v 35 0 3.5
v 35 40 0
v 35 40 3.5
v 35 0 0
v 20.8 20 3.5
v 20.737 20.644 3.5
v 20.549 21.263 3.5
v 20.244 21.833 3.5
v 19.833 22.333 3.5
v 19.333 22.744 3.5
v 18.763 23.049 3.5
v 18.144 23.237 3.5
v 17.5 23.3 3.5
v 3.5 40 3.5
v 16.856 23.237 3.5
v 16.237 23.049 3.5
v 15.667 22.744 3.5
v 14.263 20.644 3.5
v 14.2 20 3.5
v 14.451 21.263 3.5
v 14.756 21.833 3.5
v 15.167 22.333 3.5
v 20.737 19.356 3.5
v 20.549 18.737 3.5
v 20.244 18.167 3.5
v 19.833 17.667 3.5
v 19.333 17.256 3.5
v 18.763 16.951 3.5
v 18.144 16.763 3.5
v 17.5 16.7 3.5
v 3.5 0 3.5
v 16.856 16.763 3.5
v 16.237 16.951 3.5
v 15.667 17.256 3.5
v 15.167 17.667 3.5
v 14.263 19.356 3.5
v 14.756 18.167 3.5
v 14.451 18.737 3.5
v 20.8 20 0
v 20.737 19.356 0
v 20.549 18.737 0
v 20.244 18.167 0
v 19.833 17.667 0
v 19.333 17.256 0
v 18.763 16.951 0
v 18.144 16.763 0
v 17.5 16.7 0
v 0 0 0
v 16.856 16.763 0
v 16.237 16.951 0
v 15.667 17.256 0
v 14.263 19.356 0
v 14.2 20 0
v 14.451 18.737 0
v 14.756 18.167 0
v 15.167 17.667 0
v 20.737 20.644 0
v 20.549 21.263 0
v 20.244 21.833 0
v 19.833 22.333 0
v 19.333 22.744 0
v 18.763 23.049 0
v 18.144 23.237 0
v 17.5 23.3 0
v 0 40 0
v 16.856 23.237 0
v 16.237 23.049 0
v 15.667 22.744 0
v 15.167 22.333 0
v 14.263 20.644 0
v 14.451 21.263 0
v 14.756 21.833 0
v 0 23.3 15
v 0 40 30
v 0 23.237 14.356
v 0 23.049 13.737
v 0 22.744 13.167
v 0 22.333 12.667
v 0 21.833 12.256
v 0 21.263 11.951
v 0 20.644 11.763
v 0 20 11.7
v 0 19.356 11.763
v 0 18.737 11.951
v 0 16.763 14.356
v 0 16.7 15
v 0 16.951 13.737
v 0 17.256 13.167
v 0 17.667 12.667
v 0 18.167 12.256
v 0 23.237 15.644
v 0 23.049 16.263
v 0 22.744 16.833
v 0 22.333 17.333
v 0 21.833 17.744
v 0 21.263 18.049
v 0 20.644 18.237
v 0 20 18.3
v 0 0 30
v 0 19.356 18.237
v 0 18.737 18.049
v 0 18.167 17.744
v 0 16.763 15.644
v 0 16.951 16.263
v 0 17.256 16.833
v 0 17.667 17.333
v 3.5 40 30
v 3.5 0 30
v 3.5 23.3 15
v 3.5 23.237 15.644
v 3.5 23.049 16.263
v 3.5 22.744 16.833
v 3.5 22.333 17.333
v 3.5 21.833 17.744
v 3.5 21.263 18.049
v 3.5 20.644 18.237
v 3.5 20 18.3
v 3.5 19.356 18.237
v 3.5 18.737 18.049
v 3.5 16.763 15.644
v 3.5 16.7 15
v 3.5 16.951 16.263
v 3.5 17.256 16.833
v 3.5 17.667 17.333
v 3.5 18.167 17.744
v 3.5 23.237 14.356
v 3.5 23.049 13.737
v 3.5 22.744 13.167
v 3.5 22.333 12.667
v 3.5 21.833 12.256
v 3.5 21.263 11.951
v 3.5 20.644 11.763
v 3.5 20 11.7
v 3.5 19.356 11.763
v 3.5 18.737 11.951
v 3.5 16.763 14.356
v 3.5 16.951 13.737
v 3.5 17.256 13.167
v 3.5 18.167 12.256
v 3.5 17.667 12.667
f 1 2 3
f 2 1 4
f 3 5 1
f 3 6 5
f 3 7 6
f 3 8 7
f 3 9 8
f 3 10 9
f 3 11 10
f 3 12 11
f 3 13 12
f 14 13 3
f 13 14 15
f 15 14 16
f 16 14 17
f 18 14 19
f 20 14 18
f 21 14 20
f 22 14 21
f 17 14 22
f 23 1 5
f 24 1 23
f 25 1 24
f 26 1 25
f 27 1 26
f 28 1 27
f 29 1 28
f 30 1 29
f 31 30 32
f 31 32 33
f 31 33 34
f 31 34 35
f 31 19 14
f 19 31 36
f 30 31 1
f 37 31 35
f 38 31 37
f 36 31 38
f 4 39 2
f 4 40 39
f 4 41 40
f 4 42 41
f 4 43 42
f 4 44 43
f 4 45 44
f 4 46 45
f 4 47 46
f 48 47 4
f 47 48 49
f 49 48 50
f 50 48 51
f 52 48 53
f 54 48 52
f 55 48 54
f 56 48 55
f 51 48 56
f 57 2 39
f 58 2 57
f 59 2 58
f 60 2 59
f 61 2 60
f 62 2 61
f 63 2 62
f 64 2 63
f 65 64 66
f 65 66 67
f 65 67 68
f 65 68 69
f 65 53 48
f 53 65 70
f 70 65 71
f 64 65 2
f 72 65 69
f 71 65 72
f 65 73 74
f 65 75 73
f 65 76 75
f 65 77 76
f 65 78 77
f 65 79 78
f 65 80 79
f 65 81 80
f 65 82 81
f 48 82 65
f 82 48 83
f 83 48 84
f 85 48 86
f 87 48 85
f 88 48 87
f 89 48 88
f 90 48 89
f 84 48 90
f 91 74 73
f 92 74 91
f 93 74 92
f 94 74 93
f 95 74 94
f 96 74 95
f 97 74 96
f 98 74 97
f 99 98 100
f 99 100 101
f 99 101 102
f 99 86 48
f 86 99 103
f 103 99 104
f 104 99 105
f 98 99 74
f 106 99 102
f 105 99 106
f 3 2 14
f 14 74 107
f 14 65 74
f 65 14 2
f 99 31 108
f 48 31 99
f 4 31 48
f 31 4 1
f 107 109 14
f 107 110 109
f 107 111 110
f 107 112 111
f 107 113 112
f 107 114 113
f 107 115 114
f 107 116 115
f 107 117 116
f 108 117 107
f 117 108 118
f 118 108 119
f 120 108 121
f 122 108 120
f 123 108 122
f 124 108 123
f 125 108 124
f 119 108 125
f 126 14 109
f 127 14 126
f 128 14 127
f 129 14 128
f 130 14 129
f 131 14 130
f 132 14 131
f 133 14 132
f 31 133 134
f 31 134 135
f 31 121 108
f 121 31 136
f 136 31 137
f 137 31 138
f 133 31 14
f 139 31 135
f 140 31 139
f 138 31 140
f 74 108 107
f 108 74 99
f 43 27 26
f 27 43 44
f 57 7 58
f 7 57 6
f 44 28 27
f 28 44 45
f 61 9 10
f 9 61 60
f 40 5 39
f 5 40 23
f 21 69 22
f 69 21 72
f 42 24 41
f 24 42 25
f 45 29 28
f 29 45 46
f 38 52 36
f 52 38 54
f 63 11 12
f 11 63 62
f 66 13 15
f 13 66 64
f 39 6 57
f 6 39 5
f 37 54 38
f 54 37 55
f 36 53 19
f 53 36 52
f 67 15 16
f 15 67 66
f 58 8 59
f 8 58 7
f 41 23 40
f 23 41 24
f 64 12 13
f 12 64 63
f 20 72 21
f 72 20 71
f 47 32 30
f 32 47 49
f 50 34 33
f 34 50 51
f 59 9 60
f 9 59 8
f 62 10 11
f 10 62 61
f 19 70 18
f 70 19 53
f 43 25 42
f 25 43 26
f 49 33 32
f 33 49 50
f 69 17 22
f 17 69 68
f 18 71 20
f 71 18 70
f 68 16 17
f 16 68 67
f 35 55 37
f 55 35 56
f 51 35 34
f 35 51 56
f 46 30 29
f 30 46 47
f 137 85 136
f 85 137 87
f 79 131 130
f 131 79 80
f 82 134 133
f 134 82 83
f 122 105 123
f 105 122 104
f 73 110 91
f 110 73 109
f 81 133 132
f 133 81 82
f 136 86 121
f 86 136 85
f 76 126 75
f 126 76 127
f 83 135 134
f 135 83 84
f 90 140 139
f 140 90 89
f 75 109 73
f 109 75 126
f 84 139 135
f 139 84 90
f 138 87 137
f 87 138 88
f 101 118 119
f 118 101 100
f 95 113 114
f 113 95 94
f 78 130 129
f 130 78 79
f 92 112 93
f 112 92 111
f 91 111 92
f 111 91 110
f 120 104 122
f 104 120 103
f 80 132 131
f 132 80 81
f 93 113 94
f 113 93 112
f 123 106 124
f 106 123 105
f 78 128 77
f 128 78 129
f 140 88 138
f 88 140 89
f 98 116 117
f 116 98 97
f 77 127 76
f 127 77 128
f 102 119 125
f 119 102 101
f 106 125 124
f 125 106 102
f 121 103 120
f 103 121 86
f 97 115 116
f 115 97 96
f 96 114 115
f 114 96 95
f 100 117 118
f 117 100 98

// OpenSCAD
$fn = 32;

// ----------------------------------------------------------------------
// L-bracket: 35 x 40 x 30 mm
// ----------------------------------------------------------------------

// --- parameters (mm) ---
base_len = 35;            // horizontal leg, X
upright_h = 30;           // vertical leg, Z
flange_w = 40;            // bracket depth, Y
mat_t = 3.5;              // plate thickness
hole_d = 6.6;             // clearance for M6

module hole_z(px, py) {
  translate([px, py, -2.5]) cylinder(h = mat_t + 5, d = hole_d);
}
module hole_x(pz, py) {
  translate([-2.5, py, pz]) rotate([0, 90, 0]) cylinder(h = mat_t + 5, d = hole_d);
}

difference() {
  union() {
    /* horizontal leg */
    cube([base_len, flange_w, mat_t]);
    /* vertical leg, overlapping the corner block */
    cube([mat_t, flange_w, upright_h]);
  }
  hole_z(17.5, 20);
  hole_x(15, 20);
}
